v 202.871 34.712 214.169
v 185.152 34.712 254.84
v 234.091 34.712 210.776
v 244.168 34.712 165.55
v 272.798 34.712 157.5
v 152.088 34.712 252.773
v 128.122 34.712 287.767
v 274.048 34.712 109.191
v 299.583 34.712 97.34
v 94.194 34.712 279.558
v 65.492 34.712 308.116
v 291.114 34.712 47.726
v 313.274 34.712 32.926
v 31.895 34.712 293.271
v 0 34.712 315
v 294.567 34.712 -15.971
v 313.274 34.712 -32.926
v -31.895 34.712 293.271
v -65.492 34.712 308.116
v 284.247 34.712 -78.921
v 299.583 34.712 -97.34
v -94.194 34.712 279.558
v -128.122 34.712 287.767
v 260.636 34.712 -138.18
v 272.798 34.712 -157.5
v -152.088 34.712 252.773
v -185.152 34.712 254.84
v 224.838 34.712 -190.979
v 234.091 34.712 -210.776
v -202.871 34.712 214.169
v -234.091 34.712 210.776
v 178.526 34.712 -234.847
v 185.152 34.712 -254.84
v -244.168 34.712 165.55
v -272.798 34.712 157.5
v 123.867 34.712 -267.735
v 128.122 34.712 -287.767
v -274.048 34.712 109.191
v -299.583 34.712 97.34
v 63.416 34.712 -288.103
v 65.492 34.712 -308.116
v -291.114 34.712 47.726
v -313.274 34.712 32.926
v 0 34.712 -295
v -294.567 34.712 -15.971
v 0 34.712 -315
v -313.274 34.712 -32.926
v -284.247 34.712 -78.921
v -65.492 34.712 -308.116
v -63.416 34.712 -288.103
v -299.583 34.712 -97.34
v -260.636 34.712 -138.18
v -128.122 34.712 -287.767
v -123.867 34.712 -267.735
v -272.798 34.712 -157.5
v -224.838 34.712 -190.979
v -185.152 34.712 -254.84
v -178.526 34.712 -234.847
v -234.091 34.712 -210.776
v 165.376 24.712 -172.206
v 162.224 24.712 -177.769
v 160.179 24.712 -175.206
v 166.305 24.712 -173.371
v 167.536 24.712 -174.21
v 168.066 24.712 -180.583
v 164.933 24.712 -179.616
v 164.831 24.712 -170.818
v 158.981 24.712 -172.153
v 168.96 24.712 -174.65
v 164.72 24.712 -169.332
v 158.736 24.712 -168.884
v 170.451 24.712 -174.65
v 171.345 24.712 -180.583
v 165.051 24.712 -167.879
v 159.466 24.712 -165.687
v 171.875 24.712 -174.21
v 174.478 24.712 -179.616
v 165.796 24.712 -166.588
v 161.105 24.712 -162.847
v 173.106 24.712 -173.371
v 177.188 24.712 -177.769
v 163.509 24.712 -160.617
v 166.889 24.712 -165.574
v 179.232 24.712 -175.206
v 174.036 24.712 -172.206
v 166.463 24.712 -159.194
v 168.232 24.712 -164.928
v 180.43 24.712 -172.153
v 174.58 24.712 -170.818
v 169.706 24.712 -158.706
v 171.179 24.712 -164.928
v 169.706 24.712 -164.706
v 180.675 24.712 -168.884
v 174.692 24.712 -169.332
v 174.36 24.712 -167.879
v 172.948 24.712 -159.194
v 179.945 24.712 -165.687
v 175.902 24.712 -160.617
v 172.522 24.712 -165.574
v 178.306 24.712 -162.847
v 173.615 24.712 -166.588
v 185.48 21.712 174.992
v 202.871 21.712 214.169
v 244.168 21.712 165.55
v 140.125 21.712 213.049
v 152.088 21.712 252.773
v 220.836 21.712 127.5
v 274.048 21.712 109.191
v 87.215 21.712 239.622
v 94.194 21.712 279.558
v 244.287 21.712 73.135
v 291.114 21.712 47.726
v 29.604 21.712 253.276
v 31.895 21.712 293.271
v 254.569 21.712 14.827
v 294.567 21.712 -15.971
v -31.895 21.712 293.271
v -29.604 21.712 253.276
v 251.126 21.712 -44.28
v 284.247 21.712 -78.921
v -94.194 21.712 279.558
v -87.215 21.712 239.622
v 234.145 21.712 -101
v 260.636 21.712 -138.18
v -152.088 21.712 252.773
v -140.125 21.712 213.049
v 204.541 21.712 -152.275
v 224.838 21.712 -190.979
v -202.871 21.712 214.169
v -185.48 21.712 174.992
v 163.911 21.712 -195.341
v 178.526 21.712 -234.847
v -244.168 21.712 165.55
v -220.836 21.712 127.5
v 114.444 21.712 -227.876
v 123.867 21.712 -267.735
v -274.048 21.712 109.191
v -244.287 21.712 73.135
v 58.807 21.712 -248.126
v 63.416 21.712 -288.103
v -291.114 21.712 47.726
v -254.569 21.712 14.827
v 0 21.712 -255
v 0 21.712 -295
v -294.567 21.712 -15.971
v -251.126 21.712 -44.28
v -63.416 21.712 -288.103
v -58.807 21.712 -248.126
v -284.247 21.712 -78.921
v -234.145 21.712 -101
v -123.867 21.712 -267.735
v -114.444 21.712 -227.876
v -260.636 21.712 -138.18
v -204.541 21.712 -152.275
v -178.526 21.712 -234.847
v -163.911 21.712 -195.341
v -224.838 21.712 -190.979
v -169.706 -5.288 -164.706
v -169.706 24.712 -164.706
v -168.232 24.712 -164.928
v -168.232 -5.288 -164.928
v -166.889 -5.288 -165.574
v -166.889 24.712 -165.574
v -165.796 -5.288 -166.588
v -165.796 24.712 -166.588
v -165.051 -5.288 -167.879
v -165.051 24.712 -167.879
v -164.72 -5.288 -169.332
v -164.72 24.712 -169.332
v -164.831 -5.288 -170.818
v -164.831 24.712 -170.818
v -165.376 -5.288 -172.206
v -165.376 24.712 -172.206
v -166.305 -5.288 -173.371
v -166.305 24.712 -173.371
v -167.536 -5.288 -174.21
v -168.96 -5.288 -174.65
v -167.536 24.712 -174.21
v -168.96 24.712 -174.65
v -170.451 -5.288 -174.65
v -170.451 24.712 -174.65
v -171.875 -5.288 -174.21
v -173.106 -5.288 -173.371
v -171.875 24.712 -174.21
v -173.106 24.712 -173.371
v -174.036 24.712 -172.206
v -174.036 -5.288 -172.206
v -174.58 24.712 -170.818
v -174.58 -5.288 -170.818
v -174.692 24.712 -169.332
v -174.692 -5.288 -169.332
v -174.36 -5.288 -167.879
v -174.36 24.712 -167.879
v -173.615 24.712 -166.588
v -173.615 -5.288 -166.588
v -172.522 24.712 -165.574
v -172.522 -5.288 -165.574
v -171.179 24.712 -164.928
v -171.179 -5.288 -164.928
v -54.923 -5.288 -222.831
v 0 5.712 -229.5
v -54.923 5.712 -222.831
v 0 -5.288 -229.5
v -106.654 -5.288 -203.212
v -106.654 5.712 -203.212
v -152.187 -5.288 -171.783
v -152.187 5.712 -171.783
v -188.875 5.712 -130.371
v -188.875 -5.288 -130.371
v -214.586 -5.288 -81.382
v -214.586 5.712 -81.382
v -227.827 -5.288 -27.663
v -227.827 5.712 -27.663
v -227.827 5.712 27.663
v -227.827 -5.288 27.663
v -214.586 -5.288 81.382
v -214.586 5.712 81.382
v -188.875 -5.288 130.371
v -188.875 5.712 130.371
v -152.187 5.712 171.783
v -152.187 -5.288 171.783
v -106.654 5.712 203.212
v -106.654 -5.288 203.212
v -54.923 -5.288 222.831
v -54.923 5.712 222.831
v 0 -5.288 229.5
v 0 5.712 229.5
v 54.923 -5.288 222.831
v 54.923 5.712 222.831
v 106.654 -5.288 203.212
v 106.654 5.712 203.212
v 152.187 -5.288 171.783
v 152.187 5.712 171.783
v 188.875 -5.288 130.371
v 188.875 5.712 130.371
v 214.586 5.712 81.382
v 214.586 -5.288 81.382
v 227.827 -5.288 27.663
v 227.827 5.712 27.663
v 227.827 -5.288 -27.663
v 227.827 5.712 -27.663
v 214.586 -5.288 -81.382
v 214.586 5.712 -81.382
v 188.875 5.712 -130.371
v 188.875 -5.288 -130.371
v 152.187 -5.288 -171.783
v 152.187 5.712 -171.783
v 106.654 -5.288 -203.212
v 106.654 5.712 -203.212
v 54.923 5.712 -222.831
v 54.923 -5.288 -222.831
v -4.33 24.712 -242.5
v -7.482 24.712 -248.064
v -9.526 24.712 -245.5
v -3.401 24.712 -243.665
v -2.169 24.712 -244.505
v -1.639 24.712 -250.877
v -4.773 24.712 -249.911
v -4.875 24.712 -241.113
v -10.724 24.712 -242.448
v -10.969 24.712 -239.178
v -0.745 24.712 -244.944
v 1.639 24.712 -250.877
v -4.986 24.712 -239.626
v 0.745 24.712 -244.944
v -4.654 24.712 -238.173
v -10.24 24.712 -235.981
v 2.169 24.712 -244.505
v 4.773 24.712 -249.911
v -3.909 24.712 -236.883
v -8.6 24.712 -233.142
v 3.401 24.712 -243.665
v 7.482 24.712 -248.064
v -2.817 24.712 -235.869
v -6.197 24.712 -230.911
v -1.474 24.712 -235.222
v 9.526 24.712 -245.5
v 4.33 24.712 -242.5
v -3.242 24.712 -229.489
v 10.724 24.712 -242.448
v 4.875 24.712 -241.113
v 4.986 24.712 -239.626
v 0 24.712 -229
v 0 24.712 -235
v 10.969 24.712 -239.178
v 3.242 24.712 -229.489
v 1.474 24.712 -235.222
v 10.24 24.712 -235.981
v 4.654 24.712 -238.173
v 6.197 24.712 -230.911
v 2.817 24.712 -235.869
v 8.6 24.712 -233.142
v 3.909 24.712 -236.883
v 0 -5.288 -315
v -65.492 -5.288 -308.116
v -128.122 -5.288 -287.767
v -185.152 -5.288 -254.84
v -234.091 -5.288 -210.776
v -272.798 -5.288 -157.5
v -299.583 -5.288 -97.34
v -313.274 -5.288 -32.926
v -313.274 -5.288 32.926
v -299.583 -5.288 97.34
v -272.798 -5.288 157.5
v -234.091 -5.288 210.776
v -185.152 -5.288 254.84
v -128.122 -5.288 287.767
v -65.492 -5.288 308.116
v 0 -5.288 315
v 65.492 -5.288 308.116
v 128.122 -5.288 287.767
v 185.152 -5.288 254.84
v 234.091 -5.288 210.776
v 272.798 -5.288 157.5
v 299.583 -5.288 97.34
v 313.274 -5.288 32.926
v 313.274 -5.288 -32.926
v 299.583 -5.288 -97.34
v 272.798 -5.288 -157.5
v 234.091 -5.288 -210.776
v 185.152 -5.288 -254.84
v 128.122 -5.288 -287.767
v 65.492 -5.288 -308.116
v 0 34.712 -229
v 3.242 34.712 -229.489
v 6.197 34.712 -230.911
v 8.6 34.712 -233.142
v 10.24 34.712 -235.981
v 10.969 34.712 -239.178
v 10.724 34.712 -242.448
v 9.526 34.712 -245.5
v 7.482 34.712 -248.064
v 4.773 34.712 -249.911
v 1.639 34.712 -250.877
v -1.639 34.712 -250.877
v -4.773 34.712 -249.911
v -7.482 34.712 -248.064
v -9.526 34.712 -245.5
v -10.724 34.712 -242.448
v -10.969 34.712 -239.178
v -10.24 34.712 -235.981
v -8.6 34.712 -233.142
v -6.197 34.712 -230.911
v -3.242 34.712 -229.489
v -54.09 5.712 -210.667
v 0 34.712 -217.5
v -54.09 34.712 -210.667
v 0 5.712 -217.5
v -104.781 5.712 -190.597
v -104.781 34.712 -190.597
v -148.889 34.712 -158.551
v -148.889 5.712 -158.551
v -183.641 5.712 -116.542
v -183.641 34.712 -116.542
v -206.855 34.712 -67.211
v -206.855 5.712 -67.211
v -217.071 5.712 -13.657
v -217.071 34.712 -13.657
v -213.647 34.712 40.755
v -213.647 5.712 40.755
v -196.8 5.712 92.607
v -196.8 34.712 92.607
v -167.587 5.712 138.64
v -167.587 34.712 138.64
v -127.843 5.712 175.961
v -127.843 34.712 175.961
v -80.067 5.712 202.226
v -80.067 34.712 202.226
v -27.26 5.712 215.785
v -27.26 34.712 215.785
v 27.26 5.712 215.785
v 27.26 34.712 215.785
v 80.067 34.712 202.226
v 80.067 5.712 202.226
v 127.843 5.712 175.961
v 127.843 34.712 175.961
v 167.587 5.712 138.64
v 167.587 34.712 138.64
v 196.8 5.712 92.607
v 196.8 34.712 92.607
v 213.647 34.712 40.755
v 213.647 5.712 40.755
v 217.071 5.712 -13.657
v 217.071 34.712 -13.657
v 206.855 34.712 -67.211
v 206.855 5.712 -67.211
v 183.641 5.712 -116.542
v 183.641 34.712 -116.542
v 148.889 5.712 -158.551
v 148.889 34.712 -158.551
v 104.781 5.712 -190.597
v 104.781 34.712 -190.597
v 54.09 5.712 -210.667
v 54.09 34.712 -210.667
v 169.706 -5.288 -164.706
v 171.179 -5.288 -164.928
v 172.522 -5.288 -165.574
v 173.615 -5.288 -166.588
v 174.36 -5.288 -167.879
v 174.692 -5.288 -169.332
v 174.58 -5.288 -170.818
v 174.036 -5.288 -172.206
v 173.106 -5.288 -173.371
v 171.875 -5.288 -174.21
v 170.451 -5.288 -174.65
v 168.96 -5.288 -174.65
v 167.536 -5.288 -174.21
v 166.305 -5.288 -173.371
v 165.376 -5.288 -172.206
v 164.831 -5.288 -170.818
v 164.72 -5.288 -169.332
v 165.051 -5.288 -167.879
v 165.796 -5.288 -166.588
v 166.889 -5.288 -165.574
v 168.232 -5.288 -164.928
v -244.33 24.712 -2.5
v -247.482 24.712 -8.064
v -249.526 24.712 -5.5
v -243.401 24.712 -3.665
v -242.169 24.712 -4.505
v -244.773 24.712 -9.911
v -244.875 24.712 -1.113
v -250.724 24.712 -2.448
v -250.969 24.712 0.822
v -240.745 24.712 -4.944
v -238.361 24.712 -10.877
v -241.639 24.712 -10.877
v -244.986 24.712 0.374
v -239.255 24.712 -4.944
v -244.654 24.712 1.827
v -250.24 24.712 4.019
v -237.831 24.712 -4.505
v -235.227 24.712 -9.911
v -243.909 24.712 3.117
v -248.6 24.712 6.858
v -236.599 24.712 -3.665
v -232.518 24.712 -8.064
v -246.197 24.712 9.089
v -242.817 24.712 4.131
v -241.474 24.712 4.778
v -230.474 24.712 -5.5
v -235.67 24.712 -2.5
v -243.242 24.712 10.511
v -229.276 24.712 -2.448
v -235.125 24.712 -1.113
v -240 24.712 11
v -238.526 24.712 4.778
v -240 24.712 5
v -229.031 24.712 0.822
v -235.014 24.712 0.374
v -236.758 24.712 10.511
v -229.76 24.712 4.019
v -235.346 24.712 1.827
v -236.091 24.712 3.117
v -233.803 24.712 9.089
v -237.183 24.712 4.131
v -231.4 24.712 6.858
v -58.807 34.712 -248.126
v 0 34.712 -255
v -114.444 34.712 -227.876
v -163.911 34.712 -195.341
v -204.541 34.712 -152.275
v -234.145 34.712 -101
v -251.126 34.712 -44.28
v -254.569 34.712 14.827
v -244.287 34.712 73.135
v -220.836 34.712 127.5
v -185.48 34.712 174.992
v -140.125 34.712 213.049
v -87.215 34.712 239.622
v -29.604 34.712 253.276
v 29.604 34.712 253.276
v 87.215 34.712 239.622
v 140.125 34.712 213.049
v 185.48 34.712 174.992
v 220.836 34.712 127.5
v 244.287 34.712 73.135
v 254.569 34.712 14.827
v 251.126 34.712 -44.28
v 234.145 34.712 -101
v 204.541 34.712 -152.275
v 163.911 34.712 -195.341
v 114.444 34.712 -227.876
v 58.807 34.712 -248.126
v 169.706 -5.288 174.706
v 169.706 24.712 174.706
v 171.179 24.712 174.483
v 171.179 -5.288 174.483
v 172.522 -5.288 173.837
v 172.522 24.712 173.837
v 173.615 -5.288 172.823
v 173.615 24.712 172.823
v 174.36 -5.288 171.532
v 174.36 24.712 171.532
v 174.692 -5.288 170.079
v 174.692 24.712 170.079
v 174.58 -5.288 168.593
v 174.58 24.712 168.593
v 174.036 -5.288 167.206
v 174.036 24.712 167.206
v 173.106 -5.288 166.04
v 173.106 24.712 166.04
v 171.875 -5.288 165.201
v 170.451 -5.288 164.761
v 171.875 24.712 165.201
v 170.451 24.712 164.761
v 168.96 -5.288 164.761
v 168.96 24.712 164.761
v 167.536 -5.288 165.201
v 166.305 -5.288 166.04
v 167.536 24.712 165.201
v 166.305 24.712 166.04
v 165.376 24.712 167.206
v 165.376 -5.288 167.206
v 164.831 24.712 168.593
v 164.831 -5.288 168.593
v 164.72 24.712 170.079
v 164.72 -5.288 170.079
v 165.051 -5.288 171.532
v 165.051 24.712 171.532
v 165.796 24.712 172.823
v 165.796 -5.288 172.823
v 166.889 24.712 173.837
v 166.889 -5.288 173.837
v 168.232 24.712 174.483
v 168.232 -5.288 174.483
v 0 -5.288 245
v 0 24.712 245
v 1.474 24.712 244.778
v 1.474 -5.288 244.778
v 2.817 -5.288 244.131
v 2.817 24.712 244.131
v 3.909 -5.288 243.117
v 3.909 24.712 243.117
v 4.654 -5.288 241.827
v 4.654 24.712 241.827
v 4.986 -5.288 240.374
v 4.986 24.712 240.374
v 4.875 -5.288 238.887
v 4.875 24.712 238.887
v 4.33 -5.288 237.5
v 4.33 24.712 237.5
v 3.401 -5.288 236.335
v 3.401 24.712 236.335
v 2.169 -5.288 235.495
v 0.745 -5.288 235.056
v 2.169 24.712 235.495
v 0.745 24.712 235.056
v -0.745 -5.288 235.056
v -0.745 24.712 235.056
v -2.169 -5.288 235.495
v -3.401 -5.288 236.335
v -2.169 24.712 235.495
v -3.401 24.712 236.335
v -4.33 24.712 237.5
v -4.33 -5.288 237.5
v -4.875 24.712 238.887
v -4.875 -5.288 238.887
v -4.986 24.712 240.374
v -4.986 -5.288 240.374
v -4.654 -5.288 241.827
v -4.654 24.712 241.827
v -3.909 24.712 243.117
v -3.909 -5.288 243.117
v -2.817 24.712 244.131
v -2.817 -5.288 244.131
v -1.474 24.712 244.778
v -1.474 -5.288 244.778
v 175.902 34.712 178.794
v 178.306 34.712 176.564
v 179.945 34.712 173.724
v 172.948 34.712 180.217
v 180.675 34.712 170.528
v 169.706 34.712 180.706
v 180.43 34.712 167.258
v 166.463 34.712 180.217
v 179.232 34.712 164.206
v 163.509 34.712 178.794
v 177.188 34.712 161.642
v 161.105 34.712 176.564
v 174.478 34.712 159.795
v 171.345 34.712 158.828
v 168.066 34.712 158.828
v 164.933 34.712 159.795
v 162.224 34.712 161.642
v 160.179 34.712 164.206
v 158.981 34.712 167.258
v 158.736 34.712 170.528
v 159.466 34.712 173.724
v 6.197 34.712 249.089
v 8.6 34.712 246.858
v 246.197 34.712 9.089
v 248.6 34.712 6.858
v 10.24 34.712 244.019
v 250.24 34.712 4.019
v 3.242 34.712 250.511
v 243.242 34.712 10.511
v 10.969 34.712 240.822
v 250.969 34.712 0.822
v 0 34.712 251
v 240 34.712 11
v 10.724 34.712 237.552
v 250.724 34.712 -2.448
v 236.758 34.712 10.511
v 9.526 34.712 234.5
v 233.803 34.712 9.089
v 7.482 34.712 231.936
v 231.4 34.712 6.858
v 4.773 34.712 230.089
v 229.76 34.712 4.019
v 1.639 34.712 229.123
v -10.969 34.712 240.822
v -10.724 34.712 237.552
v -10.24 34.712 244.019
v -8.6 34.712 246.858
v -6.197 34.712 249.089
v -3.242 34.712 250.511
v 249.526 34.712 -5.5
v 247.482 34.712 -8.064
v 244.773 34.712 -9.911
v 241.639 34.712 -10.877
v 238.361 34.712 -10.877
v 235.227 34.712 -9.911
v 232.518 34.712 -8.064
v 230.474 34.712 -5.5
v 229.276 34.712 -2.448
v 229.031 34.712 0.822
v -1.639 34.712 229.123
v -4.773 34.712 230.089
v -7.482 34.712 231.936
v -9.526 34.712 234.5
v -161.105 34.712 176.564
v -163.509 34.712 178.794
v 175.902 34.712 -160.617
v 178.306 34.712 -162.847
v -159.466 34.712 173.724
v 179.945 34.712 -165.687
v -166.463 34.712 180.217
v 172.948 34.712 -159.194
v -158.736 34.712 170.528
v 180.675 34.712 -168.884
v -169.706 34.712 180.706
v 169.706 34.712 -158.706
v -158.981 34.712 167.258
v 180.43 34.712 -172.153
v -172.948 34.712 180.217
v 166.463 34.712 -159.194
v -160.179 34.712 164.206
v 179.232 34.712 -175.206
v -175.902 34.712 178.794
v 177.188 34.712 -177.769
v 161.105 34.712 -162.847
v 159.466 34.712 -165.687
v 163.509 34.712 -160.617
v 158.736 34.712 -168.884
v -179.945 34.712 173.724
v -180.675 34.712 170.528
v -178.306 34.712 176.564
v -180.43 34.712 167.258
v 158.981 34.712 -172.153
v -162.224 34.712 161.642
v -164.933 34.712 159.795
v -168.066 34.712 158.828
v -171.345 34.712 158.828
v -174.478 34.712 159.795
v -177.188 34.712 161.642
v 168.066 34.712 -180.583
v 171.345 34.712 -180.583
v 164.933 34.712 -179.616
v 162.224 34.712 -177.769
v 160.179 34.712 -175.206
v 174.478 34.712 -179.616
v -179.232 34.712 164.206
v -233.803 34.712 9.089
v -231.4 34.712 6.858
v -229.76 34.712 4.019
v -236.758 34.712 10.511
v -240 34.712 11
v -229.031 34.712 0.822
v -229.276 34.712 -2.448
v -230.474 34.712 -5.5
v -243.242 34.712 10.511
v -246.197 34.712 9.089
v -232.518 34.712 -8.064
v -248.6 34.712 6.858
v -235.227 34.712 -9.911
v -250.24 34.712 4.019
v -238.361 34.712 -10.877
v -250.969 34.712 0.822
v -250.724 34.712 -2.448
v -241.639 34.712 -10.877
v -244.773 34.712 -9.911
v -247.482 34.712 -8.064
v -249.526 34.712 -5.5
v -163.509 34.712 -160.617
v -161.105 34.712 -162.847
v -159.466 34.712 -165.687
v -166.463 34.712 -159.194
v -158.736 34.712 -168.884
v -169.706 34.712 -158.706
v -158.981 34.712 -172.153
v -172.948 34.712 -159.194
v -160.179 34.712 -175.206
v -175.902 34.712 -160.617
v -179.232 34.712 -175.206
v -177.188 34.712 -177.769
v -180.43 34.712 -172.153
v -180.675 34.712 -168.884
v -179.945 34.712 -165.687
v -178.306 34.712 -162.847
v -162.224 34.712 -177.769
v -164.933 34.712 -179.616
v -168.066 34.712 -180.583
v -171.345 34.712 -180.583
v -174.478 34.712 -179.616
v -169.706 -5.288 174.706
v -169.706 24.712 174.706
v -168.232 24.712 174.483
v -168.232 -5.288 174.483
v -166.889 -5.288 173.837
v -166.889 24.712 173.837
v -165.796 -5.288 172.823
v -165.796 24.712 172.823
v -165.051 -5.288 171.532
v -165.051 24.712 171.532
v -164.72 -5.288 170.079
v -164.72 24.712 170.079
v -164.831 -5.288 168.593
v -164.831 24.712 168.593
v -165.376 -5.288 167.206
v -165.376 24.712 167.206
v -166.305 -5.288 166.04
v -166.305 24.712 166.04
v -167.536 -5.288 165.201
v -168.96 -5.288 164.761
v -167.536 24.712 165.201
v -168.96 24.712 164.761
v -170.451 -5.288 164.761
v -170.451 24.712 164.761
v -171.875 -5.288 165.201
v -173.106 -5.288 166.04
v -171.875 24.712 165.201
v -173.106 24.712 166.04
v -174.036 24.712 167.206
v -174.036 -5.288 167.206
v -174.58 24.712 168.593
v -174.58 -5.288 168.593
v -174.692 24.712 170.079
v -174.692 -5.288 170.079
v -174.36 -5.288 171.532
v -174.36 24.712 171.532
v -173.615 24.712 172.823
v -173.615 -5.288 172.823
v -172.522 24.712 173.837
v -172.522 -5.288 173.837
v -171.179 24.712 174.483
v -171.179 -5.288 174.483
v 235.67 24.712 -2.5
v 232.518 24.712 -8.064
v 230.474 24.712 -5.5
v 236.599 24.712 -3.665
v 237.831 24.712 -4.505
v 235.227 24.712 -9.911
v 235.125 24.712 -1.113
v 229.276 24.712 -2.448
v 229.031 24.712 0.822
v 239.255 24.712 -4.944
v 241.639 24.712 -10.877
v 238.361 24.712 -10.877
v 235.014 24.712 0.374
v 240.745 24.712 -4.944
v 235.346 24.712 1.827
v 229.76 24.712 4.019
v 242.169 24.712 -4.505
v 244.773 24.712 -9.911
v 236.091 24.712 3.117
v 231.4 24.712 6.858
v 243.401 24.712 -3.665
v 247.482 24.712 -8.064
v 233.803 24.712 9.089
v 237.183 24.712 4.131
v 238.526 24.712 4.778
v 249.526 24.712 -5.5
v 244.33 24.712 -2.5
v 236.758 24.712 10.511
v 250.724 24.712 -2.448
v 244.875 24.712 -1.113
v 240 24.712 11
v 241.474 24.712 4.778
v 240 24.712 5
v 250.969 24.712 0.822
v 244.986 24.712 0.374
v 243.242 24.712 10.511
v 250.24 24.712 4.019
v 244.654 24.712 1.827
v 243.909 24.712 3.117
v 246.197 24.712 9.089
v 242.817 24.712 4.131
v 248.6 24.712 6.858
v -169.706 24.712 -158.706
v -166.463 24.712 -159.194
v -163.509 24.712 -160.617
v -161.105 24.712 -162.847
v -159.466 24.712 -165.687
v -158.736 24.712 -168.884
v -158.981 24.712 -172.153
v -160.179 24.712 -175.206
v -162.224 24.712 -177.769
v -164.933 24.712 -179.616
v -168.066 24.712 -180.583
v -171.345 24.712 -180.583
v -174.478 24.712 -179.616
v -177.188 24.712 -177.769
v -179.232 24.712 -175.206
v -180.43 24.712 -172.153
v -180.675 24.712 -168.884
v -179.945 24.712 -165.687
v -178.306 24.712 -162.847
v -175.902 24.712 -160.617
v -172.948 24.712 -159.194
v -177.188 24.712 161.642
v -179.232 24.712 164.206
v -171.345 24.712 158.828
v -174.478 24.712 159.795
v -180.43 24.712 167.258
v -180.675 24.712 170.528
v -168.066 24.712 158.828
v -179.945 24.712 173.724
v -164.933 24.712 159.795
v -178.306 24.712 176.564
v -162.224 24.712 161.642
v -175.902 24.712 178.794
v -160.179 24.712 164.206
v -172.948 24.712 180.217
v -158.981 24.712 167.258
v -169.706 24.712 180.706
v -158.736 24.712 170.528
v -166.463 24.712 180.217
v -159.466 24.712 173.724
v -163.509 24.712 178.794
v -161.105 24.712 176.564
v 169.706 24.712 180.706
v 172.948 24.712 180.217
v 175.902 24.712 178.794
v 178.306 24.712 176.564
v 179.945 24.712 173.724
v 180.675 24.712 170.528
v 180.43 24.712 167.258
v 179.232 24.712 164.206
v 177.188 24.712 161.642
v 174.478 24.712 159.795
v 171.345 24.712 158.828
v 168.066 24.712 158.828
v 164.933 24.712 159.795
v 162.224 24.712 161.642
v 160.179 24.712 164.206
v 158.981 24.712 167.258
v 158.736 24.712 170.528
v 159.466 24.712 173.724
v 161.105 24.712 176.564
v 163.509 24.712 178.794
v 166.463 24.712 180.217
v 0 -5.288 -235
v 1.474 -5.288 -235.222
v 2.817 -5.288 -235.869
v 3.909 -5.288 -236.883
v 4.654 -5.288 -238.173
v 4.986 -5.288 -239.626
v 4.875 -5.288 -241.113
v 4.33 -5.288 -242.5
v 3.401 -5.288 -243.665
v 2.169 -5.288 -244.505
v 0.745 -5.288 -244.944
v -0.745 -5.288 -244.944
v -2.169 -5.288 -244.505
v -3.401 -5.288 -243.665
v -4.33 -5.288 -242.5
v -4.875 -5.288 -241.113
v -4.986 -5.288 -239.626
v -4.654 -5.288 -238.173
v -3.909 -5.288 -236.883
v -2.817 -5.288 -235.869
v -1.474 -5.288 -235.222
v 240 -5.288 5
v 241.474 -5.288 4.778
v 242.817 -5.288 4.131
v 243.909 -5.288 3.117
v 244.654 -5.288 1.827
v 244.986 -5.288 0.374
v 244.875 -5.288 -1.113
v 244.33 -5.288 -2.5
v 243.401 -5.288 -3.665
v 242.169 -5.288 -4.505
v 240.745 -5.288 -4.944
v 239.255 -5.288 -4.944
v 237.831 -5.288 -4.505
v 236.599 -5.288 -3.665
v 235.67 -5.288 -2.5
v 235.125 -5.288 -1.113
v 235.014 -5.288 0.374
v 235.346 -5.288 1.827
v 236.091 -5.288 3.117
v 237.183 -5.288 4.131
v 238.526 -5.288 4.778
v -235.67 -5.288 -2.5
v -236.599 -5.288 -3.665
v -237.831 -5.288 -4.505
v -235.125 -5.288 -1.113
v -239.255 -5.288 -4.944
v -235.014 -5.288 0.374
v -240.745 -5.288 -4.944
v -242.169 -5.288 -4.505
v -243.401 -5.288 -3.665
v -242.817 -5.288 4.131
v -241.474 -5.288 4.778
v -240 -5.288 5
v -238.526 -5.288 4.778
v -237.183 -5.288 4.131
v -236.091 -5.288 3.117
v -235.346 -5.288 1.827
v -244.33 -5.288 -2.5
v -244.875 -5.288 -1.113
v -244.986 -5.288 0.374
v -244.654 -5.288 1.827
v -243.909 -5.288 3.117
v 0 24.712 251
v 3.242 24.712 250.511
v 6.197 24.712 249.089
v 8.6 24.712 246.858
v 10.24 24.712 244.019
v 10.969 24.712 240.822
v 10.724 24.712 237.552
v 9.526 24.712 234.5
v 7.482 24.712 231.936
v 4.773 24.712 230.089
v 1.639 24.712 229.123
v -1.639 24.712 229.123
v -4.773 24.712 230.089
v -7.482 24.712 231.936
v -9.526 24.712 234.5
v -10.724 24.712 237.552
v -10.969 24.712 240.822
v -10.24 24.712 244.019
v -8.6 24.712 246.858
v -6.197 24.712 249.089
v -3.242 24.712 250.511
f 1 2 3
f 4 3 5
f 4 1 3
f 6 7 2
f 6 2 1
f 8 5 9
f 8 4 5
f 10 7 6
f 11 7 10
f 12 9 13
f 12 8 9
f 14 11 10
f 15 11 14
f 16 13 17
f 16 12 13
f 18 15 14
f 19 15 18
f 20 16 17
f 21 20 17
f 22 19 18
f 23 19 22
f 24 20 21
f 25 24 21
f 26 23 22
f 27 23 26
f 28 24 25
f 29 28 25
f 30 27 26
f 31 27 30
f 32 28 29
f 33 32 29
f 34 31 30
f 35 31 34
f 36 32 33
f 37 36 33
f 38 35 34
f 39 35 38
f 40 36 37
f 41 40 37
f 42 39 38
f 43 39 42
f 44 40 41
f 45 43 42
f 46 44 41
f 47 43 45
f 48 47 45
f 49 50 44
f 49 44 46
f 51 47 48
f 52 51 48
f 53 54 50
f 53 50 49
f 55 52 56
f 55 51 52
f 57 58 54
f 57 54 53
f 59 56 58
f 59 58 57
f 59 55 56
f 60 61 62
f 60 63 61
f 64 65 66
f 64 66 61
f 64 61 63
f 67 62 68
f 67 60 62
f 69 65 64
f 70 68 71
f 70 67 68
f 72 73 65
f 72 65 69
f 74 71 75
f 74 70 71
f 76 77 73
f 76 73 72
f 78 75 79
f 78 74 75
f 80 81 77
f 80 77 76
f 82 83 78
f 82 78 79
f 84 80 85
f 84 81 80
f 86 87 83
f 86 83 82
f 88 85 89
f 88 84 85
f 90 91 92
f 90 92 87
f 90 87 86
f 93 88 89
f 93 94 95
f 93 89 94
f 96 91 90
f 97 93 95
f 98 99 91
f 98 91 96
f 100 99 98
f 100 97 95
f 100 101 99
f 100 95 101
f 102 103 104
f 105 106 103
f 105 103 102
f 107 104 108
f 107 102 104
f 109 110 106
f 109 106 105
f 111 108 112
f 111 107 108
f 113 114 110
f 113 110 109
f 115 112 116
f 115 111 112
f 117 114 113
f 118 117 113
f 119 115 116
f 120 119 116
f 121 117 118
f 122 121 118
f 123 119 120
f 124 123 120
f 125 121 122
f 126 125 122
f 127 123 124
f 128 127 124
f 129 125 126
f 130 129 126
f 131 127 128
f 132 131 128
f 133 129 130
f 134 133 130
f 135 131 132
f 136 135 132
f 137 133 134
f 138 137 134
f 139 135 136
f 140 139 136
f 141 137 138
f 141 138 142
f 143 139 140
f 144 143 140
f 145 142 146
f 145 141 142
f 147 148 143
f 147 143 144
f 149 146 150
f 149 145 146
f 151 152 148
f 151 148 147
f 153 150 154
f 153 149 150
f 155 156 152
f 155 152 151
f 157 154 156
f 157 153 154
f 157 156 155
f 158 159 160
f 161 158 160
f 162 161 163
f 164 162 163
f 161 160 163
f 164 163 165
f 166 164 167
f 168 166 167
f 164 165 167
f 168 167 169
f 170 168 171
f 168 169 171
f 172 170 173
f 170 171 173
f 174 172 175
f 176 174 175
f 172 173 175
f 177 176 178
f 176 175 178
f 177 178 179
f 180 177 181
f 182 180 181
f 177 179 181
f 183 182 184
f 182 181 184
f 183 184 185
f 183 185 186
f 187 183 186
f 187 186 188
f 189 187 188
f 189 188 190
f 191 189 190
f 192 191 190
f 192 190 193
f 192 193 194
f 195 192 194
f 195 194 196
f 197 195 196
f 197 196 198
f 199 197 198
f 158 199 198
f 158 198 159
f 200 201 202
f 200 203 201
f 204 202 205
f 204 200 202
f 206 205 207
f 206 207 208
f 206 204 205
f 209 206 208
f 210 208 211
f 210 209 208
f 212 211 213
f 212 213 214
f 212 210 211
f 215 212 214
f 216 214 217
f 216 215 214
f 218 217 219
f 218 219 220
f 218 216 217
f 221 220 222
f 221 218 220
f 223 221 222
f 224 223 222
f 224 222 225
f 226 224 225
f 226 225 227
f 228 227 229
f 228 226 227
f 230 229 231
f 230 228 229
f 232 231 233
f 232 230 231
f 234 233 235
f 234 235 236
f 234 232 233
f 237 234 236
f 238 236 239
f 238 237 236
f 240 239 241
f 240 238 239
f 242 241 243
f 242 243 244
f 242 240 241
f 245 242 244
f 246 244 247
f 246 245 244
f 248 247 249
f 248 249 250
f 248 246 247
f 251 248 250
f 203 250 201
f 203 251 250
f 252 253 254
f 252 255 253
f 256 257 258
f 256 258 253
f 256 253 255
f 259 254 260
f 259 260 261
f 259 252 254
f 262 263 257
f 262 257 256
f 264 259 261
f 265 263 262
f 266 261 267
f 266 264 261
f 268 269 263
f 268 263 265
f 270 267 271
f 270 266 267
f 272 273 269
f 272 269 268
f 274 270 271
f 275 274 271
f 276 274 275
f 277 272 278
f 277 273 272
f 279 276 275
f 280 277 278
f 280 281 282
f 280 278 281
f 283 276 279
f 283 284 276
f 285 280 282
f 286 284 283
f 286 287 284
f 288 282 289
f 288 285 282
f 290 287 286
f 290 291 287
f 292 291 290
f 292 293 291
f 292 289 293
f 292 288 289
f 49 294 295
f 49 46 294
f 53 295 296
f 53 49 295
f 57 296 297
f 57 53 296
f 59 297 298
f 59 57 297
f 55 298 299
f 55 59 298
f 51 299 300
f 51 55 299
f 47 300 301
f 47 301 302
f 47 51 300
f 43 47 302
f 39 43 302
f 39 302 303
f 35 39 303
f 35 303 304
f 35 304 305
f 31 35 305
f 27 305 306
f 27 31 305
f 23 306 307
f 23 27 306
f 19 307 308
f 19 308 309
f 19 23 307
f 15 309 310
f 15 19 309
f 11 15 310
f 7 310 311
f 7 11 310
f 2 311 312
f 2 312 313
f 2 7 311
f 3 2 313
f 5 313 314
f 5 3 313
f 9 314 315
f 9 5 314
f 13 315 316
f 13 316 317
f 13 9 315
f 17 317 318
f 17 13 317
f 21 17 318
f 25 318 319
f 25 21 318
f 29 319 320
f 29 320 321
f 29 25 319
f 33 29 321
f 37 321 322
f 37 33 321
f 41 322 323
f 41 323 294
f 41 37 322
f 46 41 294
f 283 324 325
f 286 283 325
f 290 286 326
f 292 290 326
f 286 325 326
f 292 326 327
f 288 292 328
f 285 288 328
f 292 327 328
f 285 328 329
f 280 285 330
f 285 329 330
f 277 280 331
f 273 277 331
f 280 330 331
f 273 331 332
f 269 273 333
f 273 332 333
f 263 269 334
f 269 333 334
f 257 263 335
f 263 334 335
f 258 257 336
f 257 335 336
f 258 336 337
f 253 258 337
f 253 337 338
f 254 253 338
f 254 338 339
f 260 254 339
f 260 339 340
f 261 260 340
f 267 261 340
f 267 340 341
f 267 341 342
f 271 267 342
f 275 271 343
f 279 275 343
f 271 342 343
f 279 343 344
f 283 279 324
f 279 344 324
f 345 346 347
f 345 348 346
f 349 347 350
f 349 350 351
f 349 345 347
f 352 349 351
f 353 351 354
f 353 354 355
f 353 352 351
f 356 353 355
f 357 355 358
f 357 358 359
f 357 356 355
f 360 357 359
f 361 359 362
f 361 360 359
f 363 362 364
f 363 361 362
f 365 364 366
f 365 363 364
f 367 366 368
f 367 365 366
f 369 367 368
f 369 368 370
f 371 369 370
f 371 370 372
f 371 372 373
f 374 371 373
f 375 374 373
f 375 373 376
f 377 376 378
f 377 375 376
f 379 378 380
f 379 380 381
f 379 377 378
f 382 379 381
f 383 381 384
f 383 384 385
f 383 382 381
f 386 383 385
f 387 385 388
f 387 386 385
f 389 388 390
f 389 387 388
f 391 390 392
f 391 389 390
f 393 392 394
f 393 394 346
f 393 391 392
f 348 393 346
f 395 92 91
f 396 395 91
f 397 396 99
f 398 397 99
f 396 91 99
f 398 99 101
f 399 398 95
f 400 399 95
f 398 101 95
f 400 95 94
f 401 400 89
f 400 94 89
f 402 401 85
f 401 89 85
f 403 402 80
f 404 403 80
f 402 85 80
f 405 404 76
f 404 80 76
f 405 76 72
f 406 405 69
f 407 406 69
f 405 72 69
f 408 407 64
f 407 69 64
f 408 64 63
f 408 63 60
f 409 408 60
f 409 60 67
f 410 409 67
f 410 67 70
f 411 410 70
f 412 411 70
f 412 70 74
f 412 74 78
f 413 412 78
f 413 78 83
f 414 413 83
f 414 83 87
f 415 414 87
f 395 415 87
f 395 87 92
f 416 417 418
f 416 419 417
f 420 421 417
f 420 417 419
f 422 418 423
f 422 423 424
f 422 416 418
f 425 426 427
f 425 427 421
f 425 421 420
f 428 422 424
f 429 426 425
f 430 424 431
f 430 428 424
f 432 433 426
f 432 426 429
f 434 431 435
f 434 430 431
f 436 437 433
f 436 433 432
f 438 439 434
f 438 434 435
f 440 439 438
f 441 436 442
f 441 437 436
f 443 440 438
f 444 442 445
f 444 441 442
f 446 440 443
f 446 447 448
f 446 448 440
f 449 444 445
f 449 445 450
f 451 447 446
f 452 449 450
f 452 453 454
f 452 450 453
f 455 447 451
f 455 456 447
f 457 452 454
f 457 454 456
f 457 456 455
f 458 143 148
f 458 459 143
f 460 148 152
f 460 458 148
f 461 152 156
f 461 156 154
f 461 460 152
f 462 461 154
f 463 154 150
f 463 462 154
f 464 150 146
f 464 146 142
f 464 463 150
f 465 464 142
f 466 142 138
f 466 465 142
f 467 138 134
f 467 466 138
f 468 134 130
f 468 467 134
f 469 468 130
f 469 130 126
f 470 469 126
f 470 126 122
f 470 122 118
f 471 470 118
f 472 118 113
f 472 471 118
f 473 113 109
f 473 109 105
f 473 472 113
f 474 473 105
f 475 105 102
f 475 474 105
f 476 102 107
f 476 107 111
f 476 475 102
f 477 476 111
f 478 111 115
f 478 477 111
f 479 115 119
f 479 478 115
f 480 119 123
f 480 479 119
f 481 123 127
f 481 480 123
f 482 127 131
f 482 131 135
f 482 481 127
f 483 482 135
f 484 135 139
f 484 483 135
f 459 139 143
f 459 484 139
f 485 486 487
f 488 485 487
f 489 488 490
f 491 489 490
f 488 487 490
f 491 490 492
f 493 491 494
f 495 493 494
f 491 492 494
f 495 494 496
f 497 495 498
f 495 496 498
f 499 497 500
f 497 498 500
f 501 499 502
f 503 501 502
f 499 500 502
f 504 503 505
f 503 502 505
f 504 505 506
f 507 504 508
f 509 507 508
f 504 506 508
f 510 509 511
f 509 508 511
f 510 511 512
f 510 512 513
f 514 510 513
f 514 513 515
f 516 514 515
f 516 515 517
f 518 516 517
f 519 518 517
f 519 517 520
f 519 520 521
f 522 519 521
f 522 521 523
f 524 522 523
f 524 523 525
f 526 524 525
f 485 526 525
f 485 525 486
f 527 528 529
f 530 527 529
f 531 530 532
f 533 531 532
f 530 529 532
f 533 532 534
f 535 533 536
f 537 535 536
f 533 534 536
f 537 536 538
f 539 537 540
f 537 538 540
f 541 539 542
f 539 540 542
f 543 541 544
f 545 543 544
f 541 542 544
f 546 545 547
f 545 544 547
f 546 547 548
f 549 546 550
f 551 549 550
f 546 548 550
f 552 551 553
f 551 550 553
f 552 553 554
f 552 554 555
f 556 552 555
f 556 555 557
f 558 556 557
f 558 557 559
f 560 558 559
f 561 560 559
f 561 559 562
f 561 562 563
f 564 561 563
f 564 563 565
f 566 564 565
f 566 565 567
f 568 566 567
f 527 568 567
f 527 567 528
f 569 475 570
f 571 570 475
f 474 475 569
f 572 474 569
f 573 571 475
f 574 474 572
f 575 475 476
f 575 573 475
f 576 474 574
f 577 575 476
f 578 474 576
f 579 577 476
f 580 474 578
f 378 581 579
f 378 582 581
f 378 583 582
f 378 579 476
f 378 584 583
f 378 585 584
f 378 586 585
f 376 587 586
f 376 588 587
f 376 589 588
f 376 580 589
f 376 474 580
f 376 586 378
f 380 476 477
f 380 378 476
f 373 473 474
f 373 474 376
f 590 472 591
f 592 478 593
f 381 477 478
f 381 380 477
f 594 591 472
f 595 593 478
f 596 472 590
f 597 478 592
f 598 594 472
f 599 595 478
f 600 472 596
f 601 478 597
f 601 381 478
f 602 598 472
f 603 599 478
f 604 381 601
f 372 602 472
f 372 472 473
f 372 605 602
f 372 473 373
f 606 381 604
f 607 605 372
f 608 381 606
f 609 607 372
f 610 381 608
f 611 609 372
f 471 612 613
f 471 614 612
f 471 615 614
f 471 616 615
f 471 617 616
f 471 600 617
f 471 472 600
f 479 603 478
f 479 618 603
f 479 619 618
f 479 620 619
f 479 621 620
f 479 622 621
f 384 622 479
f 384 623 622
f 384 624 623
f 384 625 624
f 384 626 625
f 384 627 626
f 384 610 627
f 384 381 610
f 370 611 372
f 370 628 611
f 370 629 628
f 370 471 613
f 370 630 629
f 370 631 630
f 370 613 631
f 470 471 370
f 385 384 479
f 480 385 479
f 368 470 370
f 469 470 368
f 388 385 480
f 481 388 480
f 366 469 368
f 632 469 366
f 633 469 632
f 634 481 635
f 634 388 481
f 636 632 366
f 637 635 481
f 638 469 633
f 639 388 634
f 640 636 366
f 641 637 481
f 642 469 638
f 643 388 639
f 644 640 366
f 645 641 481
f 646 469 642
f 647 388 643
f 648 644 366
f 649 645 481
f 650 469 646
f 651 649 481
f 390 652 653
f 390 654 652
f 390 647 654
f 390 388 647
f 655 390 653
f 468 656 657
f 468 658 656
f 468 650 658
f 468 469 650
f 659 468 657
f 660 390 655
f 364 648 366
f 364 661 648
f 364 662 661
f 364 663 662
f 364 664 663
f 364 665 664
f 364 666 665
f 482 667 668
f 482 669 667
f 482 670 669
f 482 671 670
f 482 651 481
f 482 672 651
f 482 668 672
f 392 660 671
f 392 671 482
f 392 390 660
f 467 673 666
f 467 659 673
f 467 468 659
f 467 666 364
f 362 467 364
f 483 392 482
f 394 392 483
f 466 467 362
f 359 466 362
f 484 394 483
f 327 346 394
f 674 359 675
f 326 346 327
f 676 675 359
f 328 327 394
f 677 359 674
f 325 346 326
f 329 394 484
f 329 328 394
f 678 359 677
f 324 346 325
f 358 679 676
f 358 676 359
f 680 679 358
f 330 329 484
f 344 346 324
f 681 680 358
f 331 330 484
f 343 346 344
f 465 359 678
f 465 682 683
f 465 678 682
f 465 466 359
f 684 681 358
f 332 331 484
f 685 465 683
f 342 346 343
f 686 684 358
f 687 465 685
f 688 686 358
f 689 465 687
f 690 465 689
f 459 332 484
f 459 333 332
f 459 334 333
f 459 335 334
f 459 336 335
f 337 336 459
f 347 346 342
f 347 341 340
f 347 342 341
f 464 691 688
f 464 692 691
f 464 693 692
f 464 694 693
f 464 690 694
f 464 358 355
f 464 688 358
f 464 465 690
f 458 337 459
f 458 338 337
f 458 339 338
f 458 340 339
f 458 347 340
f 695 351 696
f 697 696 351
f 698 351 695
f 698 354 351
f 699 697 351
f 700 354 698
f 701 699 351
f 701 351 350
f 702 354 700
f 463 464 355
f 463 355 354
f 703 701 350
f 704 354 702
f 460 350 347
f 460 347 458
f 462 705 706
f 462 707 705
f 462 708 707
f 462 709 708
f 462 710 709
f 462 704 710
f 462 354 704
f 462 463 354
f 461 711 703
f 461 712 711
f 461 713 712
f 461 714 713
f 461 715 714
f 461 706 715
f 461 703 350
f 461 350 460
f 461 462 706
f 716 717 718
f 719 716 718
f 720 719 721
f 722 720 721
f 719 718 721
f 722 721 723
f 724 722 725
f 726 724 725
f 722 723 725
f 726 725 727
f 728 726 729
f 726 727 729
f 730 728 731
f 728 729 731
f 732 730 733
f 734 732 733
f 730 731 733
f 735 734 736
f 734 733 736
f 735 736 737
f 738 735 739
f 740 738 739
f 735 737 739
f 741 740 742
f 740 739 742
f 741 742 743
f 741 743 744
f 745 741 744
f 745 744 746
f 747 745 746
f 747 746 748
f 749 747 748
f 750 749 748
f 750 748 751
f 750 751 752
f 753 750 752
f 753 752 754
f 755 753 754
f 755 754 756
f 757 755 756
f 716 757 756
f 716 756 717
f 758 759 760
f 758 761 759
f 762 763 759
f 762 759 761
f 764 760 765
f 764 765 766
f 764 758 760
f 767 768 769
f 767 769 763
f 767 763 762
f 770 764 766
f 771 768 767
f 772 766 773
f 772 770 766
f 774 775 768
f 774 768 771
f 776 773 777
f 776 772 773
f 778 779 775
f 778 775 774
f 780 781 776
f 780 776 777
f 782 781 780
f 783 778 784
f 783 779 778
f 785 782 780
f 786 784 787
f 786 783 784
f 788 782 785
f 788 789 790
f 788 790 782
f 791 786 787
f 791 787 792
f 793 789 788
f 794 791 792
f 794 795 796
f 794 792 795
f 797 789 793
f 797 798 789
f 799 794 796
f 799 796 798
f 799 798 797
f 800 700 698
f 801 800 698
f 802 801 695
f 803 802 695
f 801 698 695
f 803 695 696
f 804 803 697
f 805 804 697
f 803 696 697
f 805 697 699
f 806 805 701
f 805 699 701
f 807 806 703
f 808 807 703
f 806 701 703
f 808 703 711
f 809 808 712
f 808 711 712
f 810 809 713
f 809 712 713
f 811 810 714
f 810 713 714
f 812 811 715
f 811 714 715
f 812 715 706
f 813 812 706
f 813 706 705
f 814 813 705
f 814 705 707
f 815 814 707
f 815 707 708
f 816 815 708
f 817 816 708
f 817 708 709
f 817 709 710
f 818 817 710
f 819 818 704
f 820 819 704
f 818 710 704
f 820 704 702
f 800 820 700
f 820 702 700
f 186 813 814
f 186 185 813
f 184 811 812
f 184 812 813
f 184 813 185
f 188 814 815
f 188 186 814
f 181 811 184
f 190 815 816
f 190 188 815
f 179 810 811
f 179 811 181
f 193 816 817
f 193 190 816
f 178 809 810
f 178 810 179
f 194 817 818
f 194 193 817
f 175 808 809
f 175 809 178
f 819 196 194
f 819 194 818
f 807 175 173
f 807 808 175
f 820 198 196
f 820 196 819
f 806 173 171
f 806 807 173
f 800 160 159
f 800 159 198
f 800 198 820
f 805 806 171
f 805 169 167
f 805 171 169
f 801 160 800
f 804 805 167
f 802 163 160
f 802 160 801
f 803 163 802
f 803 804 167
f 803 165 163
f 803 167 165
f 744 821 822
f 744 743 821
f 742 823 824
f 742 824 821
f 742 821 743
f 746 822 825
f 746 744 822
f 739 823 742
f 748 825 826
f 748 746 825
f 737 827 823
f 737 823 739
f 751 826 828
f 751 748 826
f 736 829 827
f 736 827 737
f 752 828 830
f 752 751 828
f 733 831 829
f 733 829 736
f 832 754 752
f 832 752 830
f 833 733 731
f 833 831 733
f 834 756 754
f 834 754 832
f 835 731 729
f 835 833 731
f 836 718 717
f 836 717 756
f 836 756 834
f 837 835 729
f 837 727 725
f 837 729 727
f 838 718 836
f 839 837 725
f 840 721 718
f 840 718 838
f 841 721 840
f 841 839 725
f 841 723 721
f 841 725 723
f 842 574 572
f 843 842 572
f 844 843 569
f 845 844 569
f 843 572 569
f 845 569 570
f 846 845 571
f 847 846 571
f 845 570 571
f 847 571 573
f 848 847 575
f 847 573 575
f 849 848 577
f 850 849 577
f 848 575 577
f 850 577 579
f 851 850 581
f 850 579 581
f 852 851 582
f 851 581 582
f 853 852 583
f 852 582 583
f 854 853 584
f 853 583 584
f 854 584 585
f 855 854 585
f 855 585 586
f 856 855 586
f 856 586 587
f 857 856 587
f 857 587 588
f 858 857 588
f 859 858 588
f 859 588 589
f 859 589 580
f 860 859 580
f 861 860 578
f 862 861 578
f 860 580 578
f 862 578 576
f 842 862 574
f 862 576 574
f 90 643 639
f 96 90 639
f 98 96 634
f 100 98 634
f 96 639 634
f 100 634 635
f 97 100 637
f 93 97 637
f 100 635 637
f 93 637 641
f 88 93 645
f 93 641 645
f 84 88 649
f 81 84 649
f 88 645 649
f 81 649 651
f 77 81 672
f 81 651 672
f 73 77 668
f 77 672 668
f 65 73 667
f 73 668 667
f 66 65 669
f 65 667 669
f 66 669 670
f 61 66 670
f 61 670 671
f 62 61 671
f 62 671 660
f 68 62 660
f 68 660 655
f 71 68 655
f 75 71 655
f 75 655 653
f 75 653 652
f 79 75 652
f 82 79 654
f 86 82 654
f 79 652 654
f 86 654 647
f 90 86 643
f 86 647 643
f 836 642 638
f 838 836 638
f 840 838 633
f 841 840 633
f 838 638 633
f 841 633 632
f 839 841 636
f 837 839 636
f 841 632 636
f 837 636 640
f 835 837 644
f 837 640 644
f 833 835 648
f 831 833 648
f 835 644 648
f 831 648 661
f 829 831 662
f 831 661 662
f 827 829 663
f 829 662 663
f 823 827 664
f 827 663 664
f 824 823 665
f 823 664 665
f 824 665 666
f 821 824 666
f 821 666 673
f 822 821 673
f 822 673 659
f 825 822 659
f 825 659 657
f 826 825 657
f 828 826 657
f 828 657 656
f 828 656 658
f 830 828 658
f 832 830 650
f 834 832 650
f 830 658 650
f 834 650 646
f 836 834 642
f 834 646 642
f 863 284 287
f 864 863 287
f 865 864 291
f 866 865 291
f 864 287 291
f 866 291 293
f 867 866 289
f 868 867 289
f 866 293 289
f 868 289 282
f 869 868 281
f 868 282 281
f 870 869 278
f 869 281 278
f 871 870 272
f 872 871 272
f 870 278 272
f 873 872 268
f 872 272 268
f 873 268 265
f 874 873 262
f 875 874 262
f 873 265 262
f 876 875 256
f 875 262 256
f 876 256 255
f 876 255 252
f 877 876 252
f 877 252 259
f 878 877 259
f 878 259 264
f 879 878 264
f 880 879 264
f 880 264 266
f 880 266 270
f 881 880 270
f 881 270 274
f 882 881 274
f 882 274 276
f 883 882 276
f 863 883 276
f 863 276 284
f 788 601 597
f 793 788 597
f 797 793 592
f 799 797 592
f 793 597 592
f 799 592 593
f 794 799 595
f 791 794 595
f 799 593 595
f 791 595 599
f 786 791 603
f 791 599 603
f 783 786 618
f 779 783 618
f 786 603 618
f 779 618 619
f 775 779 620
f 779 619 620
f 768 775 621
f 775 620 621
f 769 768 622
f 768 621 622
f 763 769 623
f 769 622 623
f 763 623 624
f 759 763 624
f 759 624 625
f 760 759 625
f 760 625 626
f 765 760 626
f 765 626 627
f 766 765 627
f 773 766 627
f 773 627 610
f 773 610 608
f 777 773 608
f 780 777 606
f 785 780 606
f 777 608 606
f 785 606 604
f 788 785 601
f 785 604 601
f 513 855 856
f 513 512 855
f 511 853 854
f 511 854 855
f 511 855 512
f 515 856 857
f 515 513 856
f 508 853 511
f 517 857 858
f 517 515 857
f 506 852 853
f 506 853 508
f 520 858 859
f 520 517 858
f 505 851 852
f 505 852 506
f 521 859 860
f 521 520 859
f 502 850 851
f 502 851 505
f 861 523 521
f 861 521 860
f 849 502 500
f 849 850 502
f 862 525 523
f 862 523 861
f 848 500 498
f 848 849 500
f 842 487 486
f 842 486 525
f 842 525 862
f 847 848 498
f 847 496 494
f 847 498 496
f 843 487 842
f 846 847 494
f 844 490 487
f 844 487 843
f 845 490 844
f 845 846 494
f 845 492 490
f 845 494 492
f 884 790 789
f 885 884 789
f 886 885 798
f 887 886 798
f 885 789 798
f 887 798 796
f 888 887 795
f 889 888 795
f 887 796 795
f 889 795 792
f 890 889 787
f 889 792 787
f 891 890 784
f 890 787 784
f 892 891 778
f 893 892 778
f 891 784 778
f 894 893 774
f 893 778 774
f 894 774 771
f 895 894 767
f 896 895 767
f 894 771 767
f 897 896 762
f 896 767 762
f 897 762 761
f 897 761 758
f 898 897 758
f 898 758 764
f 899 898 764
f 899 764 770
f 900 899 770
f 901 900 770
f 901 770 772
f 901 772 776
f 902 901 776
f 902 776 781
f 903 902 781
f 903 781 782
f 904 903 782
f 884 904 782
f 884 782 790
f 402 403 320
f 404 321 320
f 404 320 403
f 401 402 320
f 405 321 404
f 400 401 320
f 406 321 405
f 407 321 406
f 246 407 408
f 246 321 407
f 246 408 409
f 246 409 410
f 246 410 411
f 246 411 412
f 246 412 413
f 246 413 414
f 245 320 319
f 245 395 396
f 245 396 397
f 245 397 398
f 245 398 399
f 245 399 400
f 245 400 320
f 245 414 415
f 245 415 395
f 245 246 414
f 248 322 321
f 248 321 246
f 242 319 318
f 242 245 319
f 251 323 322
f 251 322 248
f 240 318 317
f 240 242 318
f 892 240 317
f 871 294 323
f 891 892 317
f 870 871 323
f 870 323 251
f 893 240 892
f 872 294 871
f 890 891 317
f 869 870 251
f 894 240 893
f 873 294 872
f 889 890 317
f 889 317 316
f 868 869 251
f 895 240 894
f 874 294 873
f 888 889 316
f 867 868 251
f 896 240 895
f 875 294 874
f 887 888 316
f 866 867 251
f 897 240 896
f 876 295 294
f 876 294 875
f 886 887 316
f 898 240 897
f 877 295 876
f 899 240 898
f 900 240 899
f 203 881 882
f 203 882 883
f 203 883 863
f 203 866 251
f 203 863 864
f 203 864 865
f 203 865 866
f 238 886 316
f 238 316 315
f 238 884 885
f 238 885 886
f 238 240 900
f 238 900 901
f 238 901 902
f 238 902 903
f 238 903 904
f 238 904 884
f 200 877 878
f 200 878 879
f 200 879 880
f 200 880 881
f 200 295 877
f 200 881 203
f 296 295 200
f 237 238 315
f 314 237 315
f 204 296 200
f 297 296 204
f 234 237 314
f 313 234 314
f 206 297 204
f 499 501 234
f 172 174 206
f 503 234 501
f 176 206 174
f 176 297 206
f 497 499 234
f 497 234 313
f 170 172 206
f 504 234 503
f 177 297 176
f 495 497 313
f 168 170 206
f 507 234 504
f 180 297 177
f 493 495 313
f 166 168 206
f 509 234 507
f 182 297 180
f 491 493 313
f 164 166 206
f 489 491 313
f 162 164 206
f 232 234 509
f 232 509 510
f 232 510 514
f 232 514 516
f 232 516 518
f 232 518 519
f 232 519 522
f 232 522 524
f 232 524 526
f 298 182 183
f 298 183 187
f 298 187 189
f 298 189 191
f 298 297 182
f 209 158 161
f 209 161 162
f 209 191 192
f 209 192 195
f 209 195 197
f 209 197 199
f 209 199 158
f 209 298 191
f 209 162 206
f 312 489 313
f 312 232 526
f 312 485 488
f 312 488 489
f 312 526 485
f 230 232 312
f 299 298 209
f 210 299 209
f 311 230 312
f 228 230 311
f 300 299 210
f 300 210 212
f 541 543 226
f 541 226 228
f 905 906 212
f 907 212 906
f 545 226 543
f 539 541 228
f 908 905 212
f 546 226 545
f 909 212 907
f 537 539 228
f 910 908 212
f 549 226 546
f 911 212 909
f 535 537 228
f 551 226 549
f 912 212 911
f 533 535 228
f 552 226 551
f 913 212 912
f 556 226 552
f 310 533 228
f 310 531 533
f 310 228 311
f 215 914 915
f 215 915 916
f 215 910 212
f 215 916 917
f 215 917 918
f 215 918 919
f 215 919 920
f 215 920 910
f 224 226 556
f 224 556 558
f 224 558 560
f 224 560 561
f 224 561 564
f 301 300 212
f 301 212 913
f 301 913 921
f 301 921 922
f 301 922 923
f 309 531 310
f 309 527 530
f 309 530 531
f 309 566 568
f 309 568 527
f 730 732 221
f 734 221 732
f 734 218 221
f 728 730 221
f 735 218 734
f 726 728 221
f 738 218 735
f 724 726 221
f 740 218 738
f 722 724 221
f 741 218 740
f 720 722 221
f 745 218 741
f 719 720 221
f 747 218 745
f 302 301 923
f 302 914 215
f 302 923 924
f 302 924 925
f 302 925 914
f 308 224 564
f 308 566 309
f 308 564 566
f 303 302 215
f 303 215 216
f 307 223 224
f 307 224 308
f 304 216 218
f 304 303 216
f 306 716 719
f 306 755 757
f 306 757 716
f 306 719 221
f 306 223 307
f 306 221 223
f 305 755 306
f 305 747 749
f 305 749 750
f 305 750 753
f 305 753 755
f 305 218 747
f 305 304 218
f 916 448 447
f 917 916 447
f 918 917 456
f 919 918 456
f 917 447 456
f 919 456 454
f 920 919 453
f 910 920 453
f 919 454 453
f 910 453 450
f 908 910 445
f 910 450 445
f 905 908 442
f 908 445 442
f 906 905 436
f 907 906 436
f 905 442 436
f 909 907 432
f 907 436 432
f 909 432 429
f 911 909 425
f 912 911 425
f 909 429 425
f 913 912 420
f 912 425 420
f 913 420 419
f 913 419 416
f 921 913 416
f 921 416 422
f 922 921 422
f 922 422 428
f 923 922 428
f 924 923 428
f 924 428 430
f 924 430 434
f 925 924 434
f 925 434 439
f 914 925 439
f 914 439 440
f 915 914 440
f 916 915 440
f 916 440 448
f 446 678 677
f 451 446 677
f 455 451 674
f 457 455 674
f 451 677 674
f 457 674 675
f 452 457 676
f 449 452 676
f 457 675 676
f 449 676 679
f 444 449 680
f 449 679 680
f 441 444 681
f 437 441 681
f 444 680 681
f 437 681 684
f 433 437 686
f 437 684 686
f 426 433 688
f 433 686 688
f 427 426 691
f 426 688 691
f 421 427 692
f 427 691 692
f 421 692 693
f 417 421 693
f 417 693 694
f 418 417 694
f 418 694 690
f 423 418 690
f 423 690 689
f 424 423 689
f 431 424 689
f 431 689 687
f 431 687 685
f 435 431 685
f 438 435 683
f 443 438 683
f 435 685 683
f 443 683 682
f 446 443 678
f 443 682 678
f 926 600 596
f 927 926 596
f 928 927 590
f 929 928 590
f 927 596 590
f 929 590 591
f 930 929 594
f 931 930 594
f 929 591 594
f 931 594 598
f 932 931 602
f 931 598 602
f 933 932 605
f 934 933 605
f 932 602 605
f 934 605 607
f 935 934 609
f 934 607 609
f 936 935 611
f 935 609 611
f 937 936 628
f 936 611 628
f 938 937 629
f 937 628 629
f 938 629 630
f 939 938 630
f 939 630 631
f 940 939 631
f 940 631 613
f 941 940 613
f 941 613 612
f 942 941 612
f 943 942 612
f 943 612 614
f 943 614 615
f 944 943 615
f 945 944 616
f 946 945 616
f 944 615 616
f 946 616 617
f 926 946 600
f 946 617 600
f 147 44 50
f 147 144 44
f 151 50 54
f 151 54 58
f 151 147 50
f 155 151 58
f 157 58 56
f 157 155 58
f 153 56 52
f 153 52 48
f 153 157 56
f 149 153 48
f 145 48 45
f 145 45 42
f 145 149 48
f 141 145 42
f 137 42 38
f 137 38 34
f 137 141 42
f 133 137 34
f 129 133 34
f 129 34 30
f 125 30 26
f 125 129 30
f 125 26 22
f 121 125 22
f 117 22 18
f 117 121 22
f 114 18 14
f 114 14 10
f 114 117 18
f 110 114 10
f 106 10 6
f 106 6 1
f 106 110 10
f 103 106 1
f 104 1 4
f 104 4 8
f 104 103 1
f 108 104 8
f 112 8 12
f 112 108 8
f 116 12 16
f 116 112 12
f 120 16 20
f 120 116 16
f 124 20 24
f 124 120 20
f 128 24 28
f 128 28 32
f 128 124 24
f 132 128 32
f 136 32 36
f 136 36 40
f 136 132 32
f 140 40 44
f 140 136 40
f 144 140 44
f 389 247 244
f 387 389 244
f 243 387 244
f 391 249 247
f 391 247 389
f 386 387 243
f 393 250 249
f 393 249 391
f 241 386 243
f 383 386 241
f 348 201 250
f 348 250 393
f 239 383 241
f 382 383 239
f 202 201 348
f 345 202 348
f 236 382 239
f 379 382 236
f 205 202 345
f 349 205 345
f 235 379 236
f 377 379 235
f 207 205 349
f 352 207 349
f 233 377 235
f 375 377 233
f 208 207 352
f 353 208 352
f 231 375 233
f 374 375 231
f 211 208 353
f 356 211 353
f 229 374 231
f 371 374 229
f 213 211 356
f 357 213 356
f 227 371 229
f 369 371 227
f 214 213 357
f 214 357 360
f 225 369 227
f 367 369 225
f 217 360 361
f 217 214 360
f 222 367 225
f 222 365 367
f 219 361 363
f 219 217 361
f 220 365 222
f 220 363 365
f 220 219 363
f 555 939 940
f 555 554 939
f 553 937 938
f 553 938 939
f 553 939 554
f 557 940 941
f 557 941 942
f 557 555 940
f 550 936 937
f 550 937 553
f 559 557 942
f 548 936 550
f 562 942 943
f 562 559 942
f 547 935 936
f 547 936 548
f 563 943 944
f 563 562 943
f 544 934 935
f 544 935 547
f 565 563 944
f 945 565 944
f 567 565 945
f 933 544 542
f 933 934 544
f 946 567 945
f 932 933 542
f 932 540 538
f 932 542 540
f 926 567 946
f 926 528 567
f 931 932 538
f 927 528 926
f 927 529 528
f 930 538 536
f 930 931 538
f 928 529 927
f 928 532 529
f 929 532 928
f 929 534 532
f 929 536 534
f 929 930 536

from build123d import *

# Parameters (mm, degrees)
SKETCH4_R          = 5
CUT_EXTRUDE1_DEPTH = 448.269493706
SKETCH5_R          = 11
CUT_EXTRUDE2_DEPTH = 10


with BuildPart() as part:
    # Sketch3 → Revolve1 (revolve)
    with BuildSketch(Plane(origin=(0, 0, 0), x_dir=(0, 0, -1), z_dir=(1, 0, 0)), mode=Mode.PRIVATE) as revolve1_sk:
        Polygon((-315, 34.712328767), (-295, 34.712328767), (-295, 21.712328767), (-255, 21.712328767), (-255, 34.712328767), (-217.5, 34.712328767), (-217.5, 5.712328767), (-229.5, 5.712328767), (-229.5, -5.287671233), (-315, -5.287671233), align=None)
    revolve(revolve1_sk.sketch.rotate(Axis((0, -1465.136435986, 0), (0, 1, 0)), 180), axis=Axis((0, -1465.136435986, 0), (0, 1, 0)))

    # Sketch4 → Cut-Extrude1 (cut, through all)
    with BuildSketch(Plane(origin=(0, 34.712328767, 0), x_dir=(1, 0, 0), z_dir=(0, 1, 0))):
        with Locations(Location((0, 240, 0), (0, 0, 270))):
            Circle(SKETCH4_R)
        with Locations(Location((169.705627485, 169.705627485, 0), (0, 0, 270))):
            Circle(SKETCH4_R)
        with Locations(Location((240, 0, 0), (0, 0, 270))):
            Circle(SKETCH4_R)
        with Locations(Location((169.705627485, -169.705627485, 0), (0, 0, 270))):
            Circle(SKETCH4_R)
        with Locations(Location((0, -240, 0), (0, 0, 270))):
            Circle(SKETCH4_R)
        with Locations(Location((-169.705627485, -169.705627485, 0), (0, 0, 270))):
            Circle(SKETCH4_R)
        with Locations(Location((-240, 0, 0), (0, 0, 270))):
            Circle(SKETCH4_R)
        with Locations(Location((-169.705627485, 169.705627485, 0), (0, 0, 270))):
            Circle(SKETCH4_R)
    extrude(amount=-CUT_EXTRUDE1_DEPTH, mode=Mode.SUBTRACT)

    # Sketch5 → Cut-Extrude2 (cut)
    with BuildSketch(Plane(origin=(0, 34.712328767, 0), x_dir=(1, 0, 0), z_dir=(0, 1, 0))):
        with Locations(Location((0, 240, 0), (0, 0, 270))):
            Circle(SKETCH5_R)
        with Locations(Location((169.705627485, 169.705627485, 0), (0, 0, 270))):
            Circle(SKETCH5_R)
        with Locations(Location((240, 0, 0), (0, 0, 270))):
            Circle(SKETCH5_R)
        with Locations(Location((169.705627485, -169.705627485, 0), (0, 0, 270))):
            Circle(SKETCH5_R)
        with Locations(Location((0, -240, 0), (0, 0, 270))):
            Circle(SKETCH5_R)
        with Locations(Location((-169.705627485, -169.705627485, 0), (0, 0, 270))):
            Circle(SKETCH5_R)
        with Locations(Location((-240, 0, 0), (0, 0, 270))):
            Circle(SKETCH5_R)
        with Locations(Location((-169.705627485, 169.705627485, 0), (0, 0, 270))):
            Circle(SKETCH5_R)
    extrude(amount=-CUT_EXTRUDE2_DEPTH, mode=Mode.SUBTRACT)


solid = part.part
